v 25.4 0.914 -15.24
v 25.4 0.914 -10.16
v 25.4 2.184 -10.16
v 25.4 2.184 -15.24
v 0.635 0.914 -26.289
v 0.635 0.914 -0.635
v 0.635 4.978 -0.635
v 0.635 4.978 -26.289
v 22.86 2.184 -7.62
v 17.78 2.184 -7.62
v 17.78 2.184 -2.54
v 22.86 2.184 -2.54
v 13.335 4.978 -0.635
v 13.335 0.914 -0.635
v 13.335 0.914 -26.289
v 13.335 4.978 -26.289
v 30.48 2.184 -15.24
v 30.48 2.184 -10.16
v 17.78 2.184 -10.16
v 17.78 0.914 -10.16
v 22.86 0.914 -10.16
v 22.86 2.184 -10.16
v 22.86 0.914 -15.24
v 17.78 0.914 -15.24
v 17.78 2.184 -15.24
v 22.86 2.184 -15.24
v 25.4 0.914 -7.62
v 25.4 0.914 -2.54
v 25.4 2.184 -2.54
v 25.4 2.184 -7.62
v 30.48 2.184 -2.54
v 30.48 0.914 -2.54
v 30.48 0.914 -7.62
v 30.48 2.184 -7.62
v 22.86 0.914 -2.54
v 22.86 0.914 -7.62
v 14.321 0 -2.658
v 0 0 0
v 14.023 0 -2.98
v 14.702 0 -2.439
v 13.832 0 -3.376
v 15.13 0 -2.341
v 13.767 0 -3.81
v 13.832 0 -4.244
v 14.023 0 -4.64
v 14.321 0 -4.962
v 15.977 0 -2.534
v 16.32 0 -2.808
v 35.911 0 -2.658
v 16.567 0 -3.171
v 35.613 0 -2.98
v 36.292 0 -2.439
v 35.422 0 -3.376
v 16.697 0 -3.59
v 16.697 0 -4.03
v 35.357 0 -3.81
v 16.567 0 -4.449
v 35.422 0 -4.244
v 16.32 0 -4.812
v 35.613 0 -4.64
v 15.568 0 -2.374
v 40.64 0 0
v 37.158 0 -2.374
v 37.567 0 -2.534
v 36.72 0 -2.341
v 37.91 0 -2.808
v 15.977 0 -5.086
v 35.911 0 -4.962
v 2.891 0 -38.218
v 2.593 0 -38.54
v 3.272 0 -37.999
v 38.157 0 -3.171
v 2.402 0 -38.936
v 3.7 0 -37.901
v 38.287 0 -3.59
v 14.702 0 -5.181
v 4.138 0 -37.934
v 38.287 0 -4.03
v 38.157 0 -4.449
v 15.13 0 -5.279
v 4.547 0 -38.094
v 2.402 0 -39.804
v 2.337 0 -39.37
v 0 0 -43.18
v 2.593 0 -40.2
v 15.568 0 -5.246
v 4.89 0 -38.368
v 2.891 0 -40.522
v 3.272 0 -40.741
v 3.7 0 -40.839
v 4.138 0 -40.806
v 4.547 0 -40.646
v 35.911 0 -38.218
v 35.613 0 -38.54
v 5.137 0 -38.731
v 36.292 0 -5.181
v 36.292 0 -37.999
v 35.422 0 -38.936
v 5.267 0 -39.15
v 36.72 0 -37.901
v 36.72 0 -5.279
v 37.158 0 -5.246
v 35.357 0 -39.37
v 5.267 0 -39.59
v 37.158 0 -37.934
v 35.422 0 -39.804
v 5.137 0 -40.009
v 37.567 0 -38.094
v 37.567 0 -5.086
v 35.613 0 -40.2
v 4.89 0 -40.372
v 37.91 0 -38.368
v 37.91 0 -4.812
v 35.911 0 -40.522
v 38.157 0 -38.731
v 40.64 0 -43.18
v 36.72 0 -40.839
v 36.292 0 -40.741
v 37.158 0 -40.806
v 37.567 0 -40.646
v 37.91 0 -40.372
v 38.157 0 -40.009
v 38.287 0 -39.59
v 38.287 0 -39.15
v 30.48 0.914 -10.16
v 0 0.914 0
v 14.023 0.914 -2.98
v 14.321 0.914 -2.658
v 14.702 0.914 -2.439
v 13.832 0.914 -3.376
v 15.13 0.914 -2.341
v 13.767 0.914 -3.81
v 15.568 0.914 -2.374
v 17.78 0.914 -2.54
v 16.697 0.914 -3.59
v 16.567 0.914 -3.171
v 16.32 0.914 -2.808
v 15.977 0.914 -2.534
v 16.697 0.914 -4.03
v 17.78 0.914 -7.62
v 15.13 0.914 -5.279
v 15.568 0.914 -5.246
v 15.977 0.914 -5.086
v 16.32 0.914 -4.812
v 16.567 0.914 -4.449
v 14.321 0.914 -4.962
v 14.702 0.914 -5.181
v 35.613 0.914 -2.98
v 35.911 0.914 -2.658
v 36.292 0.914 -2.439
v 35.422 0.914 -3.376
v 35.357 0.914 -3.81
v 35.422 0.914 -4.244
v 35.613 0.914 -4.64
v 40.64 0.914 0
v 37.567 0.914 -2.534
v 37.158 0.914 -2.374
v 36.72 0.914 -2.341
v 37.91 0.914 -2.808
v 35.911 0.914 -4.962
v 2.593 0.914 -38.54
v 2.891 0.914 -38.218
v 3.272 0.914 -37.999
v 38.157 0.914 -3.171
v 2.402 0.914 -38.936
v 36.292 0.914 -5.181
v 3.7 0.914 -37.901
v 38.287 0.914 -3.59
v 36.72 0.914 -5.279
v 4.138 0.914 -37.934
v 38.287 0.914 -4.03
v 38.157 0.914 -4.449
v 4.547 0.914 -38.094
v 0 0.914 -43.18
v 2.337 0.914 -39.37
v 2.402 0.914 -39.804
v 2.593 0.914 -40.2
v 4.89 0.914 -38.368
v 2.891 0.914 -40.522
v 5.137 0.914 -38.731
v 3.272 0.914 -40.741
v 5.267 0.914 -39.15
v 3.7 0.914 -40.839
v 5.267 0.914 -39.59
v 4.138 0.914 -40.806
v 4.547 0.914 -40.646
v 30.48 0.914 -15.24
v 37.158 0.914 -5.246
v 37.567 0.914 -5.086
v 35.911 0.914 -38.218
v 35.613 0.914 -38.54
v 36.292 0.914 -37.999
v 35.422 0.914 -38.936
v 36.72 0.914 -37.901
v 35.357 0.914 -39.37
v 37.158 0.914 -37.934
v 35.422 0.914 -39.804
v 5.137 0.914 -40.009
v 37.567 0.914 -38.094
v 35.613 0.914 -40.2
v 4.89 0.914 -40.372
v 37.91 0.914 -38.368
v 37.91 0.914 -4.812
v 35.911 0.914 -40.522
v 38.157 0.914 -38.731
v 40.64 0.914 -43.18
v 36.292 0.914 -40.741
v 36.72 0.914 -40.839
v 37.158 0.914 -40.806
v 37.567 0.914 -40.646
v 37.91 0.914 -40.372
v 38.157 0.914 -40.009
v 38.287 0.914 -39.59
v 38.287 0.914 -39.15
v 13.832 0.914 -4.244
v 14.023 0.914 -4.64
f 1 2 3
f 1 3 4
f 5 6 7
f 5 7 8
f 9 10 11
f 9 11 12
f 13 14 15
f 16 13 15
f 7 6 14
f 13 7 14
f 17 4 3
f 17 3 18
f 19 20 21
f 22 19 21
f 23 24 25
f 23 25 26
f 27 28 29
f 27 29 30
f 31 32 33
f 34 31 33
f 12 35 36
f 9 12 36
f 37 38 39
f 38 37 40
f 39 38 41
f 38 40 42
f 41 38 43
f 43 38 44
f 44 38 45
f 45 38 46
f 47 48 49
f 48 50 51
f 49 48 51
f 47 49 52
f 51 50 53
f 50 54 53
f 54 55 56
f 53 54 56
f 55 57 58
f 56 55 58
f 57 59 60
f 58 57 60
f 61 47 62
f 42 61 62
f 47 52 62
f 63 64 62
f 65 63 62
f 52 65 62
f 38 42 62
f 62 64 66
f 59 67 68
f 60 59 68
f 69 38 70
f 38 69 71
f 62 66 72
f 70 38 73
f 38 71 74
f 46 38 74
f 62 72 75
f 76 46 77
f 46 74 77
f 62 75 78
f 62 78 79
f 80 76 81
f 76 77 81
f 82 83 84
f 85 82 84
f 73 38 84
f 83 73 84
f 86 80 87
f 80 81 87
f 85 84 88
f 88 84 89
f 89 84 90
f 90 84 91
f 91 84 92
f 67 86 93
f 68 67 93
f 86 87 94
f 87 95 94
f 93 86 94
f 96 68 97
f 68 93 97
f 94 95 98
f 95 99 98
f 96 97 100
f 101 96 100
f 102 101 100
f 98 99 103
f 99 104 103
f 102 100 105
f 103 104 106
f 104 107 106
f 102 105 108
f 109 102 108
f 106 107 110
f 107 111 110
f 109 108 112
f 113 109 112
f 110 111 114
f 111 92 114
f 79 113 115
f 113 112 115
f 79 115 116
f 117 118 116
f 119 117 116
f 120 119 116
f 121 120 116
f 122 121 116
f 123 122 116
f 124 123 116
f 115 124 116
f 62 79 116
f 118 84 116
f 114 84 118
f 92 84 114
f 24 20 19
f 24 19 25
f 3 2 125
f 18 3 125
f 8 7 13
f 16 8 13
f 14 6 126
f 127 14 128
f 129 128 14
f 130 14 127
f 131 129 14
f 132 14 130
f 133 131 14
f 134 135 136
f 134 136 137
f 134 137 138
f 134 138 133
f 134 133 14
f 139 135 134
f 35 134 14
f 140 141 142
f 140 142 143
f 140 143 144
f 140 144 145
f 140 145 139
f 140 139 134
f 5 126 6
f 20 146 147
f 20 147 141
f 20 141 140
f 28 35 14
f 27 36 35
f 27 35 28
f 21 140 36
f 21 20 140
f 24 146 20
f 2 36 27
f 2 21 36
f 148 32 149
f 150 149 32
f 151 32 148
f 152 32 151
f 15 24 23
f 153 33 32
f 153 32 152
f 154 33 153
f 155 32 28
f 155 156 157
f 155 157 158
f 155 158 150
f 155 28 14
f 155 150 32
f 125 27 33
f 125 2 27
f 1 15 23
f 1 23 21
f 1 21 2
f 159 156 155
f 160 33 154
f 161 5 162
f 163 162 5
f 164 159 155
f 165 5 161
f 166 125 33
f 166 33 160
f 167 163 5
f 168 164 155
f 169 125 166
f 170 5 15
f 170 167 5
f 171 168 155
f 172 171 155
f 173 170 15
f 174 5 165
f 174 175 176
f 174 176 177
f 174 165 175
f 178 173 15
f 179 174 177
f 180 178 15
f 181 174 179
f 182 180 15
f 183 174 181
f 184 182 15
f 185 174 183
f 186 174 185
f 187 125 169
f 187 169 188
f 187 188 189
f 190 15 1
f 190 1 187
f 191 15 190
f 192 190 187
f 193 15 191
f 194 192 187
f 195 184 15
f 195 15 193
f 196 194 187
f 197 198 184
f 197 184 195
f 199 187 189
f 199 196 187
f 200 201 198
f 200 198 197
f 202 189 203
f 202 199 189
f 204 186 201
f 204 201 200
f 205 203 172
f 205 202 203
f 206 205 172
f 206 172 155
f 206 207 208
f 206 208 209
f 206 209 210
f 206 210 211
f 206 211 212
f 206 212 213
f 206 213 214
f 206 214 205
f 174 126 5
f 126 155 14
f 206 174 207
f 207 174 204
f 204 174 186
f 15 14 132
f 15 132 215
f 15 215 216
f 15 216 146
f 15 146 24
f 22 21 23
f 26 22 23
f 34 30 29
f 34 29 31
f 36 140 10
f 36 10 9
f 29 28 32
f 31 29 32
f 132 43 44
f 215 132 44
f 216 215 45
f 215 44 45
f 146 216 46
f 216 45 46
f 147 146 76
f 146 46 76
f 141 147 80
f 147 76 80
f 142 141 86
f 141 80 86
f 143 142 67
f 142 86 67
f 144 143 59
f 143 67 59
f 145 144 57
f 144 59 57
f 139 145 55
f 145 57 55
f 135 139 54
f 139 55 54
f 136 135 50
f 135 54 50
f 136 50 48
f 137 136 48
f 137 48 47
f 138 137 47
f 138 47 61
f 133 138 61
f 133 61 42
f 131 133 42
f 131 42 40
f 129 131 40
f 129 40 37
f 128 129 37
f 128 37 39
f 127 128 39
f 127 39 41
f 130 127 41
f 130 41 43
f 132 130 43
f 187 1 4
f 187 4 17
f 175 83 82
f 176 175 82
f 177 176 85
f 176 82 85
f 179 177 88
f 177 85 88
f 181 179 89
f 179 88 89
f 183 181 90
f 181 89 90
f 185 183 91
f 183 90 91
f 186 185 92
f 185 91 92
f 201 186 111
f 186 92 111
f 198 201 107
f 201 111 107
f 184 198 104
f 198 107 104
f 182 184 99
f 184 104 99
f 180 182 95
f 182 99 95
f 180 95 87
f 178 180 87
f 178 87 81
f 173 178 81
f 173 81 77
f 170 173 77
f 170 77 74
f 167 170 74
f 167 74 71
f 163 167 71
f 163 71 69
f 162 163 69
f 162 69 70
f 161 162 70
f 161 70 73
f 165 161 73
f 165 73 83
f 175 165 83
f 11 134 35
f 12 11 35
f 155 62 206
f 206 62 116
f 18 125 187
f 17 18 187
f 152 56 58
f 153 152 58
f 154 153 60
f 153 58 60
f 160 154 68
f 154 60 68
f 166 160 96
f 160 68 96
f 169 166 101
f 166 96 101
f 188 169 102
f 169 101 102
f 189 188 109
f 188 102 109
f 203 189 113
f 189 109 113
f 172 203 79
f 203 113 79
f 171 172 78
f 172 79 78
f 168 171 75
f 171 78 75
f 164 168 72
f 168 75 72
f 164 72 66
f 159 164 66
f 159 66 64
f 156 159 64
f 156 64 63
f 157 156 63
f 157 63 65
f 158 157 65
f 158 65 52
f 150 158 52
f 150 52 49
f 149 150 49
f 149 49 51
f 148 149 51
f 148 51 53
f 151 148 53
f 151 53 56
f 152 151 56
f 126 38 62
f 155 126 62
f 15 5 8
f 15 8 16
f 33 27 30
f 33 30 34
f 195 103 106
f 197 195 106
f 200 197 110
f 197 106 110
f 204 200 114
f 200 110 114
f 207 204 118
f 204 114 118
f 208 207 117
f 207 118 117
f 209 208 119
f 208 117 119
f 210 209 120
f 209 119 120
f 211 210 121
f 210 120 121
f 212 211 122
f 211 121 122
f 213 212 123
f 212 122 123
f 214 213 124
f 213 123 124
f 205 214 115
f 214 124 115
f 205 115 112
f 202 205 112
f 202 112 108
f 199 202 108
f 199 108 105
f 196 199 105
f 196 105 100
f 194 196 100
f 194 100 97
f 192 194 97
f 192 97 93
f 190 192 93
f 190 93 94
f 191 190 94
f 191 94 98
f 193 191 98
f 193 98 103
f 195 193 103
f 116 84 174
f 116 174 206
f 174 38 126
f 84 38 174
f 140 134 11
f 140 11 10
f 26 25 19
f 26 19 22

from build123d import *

# Parameters (mm, degrees)
SKETCH1_W                       = 40.64
SKETCH1_H                       = 43.18
BOSS_EXTRUDE1_DEPTH             = 0.9144
SKETCH3_W                       = 5.08
SKETCH3_H                       = 5.08
BOSS_EXTRUDE2_DEPTH             = 1.27
SKETCH4_W                       = 12.7
SKETCH4_H                       = 25.654
BOSS_EXTRUDE3_DEPTH             = 4.064
F_32_0_116_DIAMETER_HOLE1_D     = 2.9464
F_32_0_116_DIAMETER_HOLE1_DEPTH = 25.4
F_32_0_116_DIAMETER_HOLE1_TIP   = 0.885187864


with BuildPart() as part:
    # Sketch1 → Boss-Extrude1 (new body)
    with BuildSketch(Plane(origin=(0, 0, 0), x_dir=(1, 0, 0), z_dir=(0, 1, 0))):
        with Locations((20.32, 21.59)):
            Rectangle(SKETCH1_W, SKETCH1_H)
    extrude(amount=BOSS_EXTRUDE1_DEPTH)

    # Sketch3 → Boss-Extrude2 (add)
    with BuildSketch(Plane(origin=(0, 0.9144, 0), x_dir=(1, 0, 0), z_dir=(0, 1, 0))):
        with Locations((20.32, 12.7)):
            Rectangle(SKETCH3_W, SKETCH3_H)
        with Locations((27.94, 12.7)):
            Rectangle(SKETCH3_W, SKETCH3_H)
        with Locations((27.94, 5.08)):
            Rectangle(SKETCH3_W, SKETCH3_H)
        with Locations((20.32, 5.08)):
            Rectangle(SKETCH3_W, SKETCH3_H)
    extrude(amount=BOSS_EXTRUDE2_DEPTH)

    # Sketch4 → Boss-Extrude3 (add)
    with BuildSketch(Plane(origin=(0, 0.9144, 0), x_dir=(1, 0, 0), z_dir=(0, 1, 0))):
        with Locations((6.985, 13.462)):
            Rectangle(SKETCH4_W, SKETCH4_H)
    extrude(amount=BOSS_EXTRUDE3_DEPTH)

    # #32 (0.116) Diameter Hole1
    with Locations(Plane(origin=(0, 0.9144, 0), x_dir=(1, 0, 0), z_dir=(0, 1, 0))):
        with Locations((3.81, 39.37), (36.83, 39.37), (36.83, 3.81), (15.24, 3.81)):
            Hole(F_32_0_116_DIAMETER_HOLE1_D / 2, depth=F_32_0_116_DIAMETER_HOLE1_DEPTH)
            with Locations((0, 0, -(F_32_0_116_DIAMETER_HOLE1_DEPTH + F_32_0_116_DIAMETER_HOLE1_TIP / 2))):  # 118° drill point
                Cone(0, F_32_0_116_DIAMETER_HOLE1_D / 2, F_32_0_116_DIAMETER_HOLE1_TIP, mode=Mode.SUBTRACT)


solid = part.part
